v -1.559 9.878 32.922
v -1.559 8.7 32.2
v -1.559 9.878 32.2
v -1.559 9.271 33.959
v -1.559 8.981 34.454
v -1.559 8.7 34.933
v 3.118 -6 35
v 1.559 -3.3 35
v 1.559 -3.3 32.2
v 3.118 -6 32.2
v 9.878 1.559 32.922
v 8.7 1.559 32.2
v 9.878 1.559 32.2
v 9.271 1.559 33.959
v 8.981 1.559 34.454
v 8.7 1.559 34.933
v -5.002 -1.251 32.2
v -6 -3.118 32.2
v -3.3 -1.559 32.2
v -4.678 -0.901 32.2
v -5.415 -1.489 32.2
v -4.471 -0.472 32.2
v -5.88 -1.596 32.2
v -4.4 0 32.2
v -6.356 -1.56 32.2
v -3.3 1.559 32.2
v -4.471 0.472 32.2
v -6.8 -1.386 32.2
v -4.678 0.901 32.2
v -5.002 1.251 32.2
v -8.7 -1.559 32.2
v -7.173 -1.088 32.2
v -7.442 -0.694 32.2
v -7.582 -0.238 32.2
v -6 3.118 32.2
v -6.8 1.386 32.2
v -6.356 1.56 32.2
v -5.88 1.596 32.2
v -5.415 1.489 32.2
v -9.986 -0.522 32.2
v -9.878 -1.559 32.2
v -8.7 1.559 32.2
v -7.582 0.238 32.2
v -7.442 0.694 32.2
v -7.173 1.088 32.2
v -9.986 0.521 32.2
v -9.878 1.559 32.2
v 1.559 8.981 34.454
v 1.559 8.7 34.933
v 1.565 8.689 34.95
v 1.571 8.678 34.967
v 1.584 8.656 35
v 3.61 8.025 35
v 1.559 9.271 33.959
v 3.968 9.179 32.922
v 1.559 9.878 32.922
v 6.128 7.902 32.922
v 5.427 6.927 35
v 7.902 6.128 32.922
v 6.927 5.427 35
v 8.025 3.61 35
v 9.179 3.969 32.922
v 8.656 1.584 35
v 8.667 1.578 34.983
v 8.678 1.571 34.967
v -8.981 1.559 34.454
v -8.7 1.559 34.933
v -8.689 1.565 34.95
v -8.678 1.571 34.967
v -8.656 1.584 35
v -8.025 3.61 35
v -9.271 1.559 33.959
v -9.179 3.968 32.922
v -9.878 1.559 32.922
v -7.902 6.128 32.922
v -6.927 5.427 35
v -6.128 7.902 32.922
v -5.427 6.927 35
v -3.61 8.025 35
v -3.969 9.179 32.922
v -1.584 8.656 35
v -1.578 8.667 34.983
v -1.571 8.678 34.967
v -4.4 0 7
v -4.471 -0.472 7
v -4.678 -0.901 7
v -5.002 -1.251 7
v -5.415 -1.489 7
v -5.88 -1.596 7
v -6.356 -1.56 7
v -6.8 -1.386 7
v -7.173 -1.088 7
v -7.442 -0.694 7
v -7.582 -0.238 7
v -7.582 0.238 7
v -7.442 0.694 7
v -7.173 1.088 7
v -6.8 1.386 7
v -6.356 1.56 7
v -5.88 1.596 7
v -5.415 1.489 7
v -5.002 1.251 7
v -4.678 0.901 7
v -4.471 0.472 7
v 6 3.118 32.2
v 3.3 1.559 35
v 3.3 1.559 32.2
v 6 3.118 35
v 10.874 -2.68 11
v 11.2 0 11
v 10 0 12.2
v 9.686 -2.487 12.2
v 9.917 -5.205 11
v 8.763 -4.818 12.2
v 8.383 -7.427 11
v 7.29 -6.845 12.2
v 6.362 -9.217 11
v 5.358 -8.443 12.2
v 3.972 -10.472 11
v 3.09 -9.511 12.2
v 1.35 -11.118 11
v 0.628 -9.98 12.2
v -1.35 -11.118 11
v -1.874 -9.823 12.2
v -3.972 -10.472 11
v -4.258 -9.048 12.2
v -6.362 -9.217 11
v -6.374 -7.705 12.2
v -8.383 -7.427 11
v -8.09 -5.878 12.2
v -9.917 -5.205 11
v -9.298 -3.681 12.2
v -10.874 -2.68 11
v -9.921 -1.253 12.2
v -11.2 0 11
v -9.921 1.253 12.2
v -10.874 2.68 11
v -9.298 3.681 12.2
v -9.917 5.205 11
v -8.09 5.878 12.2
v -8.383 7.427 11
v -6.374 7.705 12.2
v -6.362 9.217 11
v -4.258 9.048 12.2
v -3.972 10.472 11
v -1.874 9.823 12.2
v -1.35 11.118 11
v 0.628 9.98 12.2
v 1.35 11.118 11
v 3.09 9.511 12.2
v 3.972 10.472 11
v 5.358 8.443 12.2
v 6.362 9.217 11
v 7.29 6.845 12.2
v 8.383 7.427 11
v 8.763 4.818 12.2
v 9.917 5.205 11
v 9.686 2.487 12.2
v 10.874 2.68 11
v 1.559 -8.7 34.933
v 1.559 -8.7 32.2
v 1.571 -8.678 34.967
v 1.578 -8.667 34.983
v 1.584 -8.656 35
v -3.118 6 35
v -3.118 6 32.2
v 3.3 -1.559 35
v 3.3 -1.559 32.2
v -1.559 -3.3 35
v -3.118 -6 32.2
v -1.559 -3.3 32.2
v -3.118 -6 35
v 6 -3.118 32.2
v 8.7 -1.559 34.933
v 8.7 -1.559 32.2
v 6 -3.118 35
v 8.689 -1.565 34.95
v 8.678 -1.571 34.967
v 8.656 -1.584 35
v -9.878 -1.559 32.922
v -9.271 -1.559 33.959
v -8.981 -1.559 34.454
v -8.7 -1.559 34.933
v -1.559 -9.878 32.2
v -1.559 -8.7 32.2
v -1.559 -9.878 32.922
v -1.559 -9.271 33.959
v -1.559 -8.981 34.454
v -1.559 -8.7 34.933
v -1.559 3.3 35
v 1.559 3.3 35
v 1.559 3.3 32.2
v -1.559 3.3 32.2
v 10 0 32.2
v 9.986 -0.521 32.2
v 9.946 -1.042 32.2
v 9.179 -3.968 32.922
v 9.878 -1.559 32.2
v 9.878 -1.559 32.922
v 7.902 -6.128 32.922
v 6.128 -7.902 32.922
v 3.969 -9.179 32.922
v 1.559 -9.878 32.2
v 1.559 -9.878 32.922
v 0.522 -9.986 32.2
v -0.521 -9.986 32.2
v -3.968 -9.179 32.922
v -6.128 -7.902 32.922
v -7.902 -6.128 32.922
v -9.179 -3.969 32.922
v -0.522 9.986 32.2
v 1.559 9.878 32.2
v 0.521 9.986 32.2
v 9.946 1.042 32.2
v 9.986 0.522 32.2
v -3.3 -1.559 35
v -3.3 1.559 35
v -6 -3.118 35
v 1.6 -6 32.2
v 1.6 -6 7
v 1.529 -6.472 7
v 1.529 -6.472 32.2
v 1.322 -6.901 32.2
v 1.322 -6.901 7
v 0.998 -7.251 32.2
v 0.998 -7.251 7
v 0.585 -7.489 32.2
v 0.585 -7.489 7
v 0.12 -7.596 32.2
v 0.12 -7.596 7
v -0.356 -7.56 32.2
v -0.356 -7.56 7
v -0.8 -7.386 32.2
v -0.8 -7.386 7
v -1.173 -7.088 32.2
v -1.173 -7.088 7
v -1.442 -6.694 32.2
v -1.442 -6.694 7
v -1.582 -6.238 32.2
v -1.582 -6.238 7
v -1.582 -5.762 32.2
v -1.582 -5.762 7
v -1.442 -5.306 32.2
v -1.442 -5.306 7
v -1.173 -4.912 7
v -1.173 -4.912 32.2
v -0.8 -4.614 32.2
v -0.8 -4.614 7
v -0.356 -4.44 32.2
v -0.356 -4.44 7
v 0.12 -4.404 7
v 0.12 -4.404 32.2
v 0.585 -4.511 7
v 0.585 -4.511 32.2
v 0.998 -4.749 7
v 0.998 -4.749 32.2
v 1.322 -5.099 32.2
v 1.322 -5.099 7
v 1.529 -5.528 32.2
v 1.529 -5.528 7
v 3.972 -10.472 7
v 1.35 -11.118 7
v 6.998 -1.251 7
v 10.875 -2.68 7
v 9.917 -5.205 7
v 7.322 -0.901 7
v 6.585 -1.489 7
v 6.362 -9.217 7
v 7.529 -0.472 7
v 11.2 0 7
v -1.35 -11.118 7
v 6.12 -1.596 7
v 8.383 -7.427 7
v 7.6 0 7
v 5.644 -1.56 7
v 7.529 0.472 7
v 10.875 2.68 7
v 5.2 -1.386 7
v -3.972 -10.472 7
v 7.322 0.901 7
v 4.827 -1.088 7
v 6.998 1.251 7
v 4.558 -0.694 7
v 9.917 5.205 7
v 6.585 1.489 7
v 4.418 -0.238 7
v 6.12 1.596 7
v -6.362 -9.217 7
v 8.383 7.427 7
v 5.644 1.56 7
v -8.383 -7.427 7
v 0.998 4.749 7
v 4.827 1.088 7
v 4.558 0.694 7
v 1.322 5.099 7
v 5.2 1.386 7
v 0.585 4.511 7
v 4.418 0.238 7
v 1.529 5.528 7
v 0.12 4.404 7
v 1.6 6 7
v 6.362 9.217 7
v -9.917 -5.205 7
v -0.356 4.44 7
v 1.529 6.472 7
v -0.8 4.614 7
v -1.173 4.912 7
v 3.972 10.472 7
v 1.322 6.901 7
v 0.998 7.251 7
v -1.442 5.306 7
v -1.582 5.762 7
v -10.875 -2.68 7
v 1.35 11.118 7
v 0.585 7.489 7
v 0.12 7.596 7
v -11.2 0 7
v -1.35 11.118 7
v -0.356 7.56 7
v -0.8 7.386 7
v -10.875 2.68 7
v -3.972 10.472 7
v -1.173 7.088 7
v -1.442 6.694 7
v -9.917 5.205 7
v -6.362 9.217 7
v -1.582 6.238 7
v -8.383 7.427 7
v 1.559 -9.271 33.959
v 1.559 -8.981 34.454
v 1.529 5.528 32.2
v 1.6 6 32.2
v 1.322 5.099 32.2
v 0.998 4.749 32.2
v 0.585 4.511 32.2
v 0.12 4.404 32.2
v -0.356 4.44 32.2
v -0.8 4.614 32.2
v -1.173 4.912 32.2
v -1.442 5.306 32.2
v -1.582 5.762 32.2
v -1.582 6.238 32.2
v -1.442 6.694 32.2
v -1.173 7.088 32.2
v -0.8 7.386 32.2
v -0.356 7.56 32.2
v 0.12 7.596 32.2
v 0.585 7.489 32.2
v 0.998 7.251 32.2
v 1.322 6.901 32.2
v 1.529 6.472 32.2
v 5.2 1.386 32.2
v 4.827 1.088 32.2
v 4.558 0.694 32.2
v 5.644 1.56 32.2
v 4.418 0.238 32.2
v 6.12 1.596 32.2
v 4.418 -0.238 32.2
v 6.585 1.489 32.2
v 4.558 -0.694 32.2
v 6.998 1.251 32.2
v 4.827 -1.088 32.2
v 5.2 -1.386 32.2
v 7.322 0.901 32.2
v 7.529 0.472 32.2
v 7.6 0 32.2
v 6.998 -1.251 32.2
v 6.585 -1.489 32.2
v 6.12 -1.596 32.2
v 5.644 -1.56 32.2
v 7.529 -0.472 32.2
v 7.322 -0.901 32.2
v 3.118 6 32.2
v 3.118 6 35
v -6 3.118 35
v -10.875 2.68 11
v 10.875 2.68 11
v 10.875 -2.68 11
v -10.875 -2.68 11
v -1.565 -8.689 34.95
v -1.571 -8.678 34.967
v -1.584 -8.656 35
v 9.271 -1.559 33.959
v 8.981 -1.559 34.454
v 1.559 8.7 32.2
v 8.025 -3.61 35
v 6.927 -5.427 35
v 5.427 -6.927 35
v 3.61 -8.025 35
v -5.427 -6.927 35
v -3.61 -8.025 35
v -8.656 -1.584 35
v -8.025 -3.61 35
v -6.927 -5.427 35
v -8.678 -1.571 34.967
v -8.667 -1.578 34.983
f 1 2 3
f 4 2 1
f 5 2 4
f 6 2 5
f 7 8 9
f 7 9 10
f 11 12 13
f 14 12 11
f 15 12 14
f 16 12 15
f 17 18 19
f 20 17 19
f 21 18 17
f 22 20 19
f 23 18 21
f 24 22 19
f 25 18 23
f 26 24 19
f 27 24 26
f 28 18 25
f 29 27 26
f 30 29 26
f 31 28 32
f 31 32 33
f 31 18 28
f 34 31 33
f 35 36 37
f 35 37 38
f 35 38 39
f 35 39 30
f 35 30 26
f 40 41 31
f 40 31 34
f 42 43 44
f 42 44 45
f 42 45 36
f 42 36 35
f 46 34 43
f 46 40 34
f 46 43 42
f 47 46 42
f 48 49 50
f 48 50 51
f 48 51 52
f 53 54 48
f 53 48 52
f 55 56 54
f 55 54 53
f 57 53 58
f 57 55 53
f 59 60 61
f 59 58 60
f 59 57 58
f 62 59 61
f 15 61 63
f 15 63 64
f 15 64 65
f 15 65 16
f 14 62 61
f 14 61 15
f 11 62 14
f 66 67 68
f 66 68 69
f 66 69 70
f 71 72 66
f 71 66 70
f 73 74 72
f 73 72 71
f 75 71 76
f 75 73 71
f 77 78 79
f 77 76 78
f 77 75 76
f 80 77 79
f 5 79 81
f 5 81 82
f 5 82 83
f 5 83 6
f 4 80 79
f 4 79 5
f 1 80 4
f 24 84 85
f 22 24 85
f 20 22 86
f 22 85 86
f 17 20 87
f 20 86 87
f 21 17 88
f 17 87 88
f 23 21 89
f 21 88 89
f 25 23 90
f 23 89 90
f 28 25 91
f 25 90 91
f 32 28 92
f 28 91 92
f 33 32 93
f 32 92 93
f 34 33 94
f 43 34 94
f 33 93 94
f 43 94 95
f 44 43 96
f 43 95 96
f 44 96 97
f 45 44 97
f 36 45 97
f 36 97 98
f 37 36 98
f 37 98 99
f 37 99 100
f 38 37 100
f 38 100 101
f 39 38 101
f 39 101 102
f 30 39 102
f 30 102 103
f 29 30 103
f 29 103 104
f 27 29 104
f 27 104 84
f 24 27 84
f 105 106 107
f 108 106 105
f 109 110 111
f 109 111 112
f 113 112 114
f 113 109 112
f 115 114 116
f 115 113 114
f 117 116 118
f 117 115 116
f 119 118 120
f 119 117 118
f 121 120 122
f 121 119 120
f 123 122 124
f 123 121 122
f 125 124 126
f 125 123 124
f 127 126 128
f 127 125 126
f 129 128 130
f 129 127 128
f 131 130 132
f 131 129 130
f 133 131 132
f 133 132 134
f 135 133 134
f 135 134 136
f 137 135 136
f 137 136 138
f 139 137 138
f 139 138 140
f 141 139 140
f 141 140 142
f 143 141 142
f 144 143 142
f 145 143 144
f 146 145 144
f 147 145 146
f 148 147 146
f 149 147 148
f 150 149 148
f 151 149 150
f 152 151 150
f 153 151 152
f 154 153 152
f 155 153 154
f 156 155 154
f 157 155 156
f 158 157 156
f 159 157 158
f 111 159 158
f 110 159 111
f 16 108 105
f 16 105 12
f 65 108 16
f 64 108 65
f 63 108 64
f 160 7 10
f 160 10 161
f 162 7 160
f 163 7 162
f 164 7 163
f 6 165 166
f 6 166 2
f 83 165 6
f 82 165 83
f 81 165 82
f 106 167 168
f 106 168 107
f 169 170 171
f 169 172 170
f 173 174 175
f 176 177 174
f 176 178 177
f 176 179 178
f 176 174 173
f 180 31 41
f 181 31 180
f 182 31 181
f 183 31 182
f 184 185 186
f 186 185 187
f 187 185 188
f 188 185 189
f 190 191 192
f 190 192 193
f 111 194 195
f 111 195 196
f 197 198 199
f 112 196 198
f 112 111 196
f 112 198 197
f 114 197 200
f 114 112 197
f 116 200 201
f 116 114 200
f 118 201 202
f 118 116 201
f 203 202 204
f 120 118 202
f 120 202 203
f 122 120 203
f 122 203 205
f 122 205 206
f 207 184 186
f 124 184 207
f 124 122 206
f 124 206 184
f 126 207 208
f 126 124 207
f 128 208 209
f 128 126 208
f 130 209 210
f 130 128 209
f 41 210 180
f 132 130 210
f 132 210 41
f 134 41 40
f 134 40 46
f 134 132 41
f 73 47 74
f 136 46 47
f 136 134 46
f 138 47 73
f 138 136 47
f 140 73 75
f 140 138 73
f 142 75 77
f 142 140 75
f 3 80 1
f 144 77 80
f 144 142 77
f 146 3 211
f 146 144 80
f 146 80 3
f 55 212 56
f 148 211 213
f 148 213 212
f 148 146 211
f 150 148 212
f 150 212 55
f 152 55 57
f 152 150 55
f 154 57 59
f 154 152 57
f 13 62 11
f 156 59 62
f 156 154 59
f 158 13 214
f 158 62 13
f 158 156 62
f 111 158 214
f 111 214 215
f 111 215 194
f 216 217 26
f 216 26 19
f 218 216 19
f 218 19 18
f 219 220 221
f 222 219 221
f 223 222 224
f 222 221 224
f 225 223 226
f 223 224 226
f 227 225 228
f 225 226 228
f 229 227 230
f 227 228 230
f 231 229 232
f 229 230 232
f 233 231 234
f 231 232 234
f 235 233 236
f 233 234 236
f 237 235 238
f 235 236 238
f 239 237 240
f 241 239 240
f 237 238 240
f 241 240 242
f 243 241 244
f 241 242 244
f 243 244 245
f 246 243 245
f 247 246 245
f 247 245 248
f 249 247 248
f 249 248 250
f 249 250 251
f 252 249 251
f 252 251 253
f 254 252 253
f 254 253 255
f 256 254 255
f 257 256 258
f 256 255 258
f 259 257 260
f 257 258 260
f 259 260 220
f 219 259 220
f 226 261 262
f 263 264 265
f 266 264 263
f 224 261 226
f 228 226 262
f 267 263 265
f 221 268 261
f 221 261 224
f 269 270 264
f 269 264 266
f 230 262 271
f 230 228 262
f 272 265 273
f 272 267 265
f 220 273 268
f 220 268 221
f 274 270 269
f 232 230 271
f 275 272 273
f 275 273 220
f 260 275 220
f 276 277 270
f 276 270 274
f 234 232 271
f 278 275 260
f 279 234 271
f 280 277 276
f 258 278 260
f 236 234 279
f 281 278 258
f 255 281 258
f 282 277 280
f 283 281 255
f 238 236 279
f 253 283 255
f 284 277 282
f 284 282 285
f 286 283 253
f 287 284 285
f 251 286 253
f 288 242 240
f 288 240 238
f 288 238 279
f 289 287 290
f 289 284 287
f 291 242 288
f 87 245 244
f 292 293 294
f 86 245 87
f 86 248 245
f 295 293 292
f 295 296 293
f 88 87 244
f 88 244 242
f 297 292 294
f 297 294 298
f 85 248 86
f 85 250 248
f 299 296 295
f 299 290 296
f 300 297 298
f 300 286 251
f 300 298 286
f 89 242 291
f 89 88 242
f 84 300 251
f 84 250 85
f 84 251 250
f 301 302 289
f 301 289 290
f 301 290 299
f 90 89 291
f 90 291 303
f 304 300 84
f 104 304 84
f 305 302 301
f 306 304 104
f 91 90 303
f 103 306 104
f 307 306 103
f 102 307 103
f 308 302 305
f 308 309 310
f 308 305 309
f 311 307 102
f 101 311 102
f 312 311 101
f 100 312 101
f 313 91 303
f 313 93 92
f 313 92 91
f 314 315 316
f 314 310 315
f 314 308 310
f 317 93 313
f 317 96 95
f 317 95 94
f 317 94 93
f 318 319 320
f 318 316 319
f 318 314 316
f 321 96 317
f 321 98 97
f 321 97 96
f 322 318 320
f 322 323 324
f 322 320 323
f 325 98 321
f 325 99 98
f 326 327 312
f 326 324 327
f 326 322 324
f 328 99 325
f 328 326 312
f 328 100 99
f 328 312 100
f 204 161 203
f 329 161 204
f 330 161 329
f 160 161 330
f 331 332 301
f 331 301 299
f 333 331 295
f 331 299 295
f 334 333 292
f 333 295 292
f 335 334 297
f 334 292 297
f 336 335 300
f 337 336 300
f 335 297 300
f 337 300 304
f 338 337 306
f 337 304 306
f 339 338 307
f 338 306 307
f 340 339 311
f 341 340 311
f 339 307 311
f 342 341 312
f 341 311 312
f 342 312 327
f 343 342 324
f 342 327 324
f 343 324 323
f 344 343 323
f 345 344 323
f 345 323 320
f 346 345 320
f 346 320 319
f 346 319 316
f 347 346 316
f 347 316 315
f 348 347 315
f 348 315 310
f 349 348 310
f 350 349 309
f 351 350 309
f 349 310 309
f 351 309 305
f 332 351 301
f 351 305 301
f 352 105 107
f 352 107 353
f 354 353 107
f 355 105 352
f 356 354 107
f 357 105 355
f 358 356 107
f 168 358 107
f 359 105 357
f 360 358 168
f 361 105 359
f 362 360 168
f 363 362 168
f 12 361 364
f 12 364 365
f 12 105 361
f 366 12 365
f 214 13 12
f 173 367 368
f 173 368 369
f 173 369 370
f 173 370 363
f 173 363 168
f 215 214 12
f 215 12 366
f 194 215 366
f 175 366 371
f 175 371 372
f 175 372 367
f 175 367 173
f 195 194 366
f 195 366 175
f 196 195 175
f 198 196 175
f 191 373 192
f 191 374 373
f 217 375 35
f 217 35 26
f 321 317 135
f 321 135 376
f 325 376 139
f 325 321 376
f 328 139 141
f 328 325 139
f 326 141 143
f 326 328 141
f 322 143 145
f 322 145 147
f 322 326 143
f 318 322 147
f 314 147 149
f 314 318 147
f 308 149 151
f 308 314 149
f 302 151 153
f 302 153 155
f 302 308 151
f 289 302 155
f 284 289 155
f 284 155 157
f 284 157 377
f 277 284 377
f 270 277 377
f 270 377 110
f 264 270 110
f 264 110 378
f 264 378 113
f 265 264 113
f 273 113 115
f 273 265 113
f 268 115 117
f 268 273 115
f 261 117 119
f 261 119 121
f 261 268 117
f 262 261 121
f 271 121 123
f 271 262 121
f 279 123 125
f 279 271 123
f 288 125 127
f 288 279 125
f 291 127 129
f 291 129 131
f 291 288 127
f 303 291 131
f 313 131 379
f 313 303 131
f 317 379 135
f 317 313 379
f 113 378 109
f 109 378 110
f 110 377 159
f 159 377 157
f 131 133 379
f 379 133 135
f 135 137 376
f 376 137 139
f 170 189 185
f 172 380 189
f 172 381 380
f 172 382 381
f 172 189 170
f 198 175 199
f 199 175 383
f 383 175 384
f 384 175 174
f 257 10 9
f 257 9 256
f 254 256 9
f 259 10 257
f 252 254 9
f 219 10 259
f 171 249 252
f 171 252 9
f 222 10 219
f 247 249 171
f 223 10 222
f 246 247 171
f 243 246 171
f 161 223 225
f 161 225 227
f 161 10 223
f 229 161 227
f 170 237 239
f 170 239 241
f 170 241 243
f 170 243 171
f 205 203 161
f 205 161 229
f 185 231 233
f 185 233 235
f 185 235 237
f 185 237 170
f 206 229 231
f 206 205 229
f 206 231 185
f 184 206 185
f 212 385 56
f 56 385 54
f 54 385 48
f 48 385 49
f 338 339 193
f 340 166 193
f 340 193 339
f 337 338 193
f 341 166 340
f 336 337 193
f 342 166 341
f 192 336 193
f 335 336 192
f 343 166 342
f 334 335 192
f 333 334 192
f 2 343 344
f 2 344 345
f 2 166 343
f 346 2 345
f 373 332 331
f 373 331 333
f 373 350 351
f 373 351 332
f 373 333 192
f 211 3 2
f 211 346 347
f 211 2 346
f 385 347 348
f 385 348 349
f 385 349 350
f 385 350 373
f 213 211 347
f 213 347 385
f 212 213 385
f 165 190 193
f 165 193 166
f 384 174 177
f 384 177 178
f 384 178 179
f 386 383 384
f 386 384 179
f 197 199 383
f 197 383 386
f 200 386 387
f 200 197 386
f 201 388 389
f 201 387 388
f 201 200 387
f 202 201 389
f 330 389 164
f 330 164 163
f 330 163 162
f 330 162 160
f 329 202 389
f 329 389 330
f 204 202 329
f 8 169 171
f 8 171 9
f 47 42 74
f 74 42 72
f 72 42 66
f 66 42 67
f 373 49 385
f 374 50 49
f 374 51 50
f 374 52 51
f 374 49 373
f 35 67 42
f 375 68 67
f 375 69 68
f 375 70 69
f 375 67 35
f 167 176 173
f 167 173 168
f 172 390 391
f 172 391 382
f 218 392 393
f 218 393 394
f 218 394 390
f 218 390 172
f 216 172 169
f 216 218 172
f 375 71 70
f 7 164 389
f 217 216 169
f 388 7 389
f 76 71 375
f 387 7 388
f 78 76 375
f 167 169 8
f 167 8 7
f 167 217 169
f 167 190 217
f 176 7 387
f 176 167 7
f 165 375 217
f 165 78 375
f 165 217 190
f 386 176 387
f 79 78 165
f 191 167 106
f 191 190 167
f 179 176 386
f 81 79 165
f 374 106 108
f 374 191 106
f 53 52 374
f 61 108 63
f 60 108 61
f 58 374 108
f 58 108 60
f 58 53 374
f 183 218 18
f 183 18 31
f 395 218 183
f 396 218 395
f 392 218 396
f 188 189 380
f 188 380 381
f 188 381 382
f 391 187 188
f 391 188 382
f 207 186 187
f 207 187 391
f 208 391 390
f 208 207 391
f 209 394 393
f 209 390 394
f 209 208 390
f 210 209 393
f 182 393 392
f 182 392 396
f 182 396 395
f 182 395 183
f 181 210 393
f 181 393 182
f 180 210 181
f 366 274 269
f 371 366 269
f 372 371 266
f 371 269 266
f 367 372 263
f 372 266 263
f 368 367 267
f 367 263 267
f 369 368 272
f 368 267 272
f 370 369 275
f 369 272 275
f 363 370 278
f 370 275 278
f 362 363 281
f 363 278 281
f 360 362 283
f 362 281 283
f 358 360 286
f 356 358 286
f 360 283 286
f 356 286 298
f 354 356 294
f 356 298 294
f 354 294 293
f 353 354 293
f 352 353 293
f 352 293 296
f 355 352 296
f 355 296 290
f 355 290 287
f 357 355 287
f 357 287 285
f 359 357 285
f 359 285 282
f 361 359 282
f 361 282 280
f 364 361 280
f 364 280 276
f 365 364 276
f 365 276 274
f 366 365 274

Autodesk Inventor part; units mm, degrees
ref_plane "YZ Plane" through (0, 0, 0) normal (1, 0, 0) x (0, 1, 0)
ref_plane "XZ Plane" through (0, 0, 0) normal (0, 1, 0) x (-1, 0, 0)
ref_plane "XY Plane" through (0, 0, 0) normal (0, 0, 1) x (1, 0, 0)
sketch "스케치1" plane through (0, 0, 0) normal (0, 0, 1) x (1, 0, 0)
  circle A0 centre (0, 0) radius 10
  line L0 (0, 0) -> (6, 0)
  line L1 (0, 0) -> (0, 6.1705) construction
  circle A1 centre (6, 0) radius 1.6
  circle A2 centre (-6, 0) radius 1.6
  line L2 (0, 0) -> (0, -6)
  circle A3 centre (0, -6) radius 1.6
  circle A4 centre (0, 6) radius 1.6
  dimension "d0" = 20
  dimension "d1" = 6
  dimension "d2" = 3.2
  dimension "d22" = 6
  dimension "d23" = 3.2
extrude "돌출1" add sketch "스케치1" along normal blind 35
sketch "스케치2" plane through (0, 0, 35) normal (0, 0, 1) x (1, 0, 0)
  line L0 (6, 0) -> (3.3, 0)
  line L1 (3.3, 1.5588) -> (6, 3.1177)
  line L2 (6, 3.1177) -> (8.7, 1.5588)
  line L3 (8.7, 1.5588) -> (8.7, -1.5588)
  line L4 (8.7, -1.5588) -> (6, -3.1177)
  line L5 (6, -3.1177) -> (3.3, -1.5588)
  line L6 (3.3, -1.5588) -> (3.3, 1.5588)
  line L7 (0, 6) -> (0, 3.3)
  line L8 (-1.5588, 3.3) -> (-3.1177, 6)
  line L9 (-3.1177, 6) -> (-1.5588, 8.7)
  line L10 (-1.5588, 8.7) -> (1.5588, 8.7)
  line L11 (1.5588, 8.7) -> (3.1177, 6)
  line L12 (3.1177, 6) -> (1.5588, 3.3)
  line L13 (1.5588, 3.3) -> (-1.5588, 3.3)
  line L14 (-6, 0) -> (-3.3, 0)
  line L15 (-3.3, -1.5588) -> (-6, -3.1177)
  line L16 (-6, -3.1177) -> (-8.7, -1.5588)
  line L17 (-8.7, -1.5588) -> (-8.7, 1.5588)
  line L18 (-8.7, 1.5588) -> (-6, 3.1177)
  line L19 (-6, 3.1177) -> (-3.3, 1.5588)
  line L20 (-3.3, 1.5588) -> (-3.3, -1.5588)
  line L21 (0, -6) -> (0, -3.3)
  line L22 (1.5588, -3.3) -> (3.1177, -6)
  line L23 (3.1177, -6) -> (1.5588, -8.7)
  line L24 (1.5588, -8.7) -> (-1.5588, -8.7)
  line L25 (-1.5588, -8.7) -> (-3.1177, -6)
  line L26 (-3.1177, -6) -> (-1.5588, -3.3)
  line L27 (-1.5588, -3.3) -> (1.5588, -3.3)
  point P0 (0, 0)
  point P1 (0, 6)
  point P2 (0, -6)
  dimension "d24" = 2.7
  dimension "d27" = 360
sketch "스케치3" plane through (0, 0, 0) normal (0, 0, -1) x (-1, 0, 0)
  circle A0 centre (0, 0) radius 10 projected
  circle A1 centre (-6, 0) radius 1.6 projected
  circle A2 centre (6, 0) radius 1.6 projected
extrude "돌출3" cut sketch "스케치3" against normal blind 7
sketch "스케치4" plane through (0, 0, 7) normal (0, 0, -1) x (-1, 0, 0)
  circle A0 centre (0, 0) radius 10 projected
  circle A1 centre (0, 0) radius 11.2
  dimension "d13" = 1.2
extrude "돌출4" add sketch "스케치4" against normal blind 4
chamfer "모따기2" distance 1.2 angle 45 1 edges at (-10, 0, 11)
chamfer "모따기3" distance 1.2 angle 60 1 edges at (-10, 0, 35) measured on face at (0.0643, -1.4706, 35)
extrude "돌출5" cut sketch "스케치2" against normal blind 2.8
sketch "스케치5" plane through (0, 0, 35) normal (0, 0, 1) x (1, 0, 0)
  circle A0 centre (0, 6) radius 1.6 projected
  line L0 (1.5588, 8.7) -> (3.1177, 6) projected
  line L1 (-1.5588, 8.7) -> (1.5588, 8.7) projected
  line L2 (-3.1177, 6) -> (-1.5588, 8.7) projected
  line L3 (-1.5588, 3.3) -> (-3.1177, 6) projected
  line L4 (1.5588, 3.3) -> (-1.5588, 3.3) projected
  line L5 (3.1177, 6) -> (1.5588, 3.3) projected
  line L6 (1.5588, 8.7) -> (1.5588, 10.4142)
  line L7 (1.5588, 10.4142) -> (-1.5595, 10.4142)
  line L8 (-1.5588, 8.7) -> (-1.5588, 10.4142)
  point P0 (0, 0)
extrude "돌출6" cut sketch "스케치5" against normal blind 2.8 contours L1 L8 L7 L6
pattern_circular "원형 패턴1" count 4 over 360 about axis through (0, 0, 0) along (0, 0, 1) of "돌출6"
properties part number "Test_Shaft"
